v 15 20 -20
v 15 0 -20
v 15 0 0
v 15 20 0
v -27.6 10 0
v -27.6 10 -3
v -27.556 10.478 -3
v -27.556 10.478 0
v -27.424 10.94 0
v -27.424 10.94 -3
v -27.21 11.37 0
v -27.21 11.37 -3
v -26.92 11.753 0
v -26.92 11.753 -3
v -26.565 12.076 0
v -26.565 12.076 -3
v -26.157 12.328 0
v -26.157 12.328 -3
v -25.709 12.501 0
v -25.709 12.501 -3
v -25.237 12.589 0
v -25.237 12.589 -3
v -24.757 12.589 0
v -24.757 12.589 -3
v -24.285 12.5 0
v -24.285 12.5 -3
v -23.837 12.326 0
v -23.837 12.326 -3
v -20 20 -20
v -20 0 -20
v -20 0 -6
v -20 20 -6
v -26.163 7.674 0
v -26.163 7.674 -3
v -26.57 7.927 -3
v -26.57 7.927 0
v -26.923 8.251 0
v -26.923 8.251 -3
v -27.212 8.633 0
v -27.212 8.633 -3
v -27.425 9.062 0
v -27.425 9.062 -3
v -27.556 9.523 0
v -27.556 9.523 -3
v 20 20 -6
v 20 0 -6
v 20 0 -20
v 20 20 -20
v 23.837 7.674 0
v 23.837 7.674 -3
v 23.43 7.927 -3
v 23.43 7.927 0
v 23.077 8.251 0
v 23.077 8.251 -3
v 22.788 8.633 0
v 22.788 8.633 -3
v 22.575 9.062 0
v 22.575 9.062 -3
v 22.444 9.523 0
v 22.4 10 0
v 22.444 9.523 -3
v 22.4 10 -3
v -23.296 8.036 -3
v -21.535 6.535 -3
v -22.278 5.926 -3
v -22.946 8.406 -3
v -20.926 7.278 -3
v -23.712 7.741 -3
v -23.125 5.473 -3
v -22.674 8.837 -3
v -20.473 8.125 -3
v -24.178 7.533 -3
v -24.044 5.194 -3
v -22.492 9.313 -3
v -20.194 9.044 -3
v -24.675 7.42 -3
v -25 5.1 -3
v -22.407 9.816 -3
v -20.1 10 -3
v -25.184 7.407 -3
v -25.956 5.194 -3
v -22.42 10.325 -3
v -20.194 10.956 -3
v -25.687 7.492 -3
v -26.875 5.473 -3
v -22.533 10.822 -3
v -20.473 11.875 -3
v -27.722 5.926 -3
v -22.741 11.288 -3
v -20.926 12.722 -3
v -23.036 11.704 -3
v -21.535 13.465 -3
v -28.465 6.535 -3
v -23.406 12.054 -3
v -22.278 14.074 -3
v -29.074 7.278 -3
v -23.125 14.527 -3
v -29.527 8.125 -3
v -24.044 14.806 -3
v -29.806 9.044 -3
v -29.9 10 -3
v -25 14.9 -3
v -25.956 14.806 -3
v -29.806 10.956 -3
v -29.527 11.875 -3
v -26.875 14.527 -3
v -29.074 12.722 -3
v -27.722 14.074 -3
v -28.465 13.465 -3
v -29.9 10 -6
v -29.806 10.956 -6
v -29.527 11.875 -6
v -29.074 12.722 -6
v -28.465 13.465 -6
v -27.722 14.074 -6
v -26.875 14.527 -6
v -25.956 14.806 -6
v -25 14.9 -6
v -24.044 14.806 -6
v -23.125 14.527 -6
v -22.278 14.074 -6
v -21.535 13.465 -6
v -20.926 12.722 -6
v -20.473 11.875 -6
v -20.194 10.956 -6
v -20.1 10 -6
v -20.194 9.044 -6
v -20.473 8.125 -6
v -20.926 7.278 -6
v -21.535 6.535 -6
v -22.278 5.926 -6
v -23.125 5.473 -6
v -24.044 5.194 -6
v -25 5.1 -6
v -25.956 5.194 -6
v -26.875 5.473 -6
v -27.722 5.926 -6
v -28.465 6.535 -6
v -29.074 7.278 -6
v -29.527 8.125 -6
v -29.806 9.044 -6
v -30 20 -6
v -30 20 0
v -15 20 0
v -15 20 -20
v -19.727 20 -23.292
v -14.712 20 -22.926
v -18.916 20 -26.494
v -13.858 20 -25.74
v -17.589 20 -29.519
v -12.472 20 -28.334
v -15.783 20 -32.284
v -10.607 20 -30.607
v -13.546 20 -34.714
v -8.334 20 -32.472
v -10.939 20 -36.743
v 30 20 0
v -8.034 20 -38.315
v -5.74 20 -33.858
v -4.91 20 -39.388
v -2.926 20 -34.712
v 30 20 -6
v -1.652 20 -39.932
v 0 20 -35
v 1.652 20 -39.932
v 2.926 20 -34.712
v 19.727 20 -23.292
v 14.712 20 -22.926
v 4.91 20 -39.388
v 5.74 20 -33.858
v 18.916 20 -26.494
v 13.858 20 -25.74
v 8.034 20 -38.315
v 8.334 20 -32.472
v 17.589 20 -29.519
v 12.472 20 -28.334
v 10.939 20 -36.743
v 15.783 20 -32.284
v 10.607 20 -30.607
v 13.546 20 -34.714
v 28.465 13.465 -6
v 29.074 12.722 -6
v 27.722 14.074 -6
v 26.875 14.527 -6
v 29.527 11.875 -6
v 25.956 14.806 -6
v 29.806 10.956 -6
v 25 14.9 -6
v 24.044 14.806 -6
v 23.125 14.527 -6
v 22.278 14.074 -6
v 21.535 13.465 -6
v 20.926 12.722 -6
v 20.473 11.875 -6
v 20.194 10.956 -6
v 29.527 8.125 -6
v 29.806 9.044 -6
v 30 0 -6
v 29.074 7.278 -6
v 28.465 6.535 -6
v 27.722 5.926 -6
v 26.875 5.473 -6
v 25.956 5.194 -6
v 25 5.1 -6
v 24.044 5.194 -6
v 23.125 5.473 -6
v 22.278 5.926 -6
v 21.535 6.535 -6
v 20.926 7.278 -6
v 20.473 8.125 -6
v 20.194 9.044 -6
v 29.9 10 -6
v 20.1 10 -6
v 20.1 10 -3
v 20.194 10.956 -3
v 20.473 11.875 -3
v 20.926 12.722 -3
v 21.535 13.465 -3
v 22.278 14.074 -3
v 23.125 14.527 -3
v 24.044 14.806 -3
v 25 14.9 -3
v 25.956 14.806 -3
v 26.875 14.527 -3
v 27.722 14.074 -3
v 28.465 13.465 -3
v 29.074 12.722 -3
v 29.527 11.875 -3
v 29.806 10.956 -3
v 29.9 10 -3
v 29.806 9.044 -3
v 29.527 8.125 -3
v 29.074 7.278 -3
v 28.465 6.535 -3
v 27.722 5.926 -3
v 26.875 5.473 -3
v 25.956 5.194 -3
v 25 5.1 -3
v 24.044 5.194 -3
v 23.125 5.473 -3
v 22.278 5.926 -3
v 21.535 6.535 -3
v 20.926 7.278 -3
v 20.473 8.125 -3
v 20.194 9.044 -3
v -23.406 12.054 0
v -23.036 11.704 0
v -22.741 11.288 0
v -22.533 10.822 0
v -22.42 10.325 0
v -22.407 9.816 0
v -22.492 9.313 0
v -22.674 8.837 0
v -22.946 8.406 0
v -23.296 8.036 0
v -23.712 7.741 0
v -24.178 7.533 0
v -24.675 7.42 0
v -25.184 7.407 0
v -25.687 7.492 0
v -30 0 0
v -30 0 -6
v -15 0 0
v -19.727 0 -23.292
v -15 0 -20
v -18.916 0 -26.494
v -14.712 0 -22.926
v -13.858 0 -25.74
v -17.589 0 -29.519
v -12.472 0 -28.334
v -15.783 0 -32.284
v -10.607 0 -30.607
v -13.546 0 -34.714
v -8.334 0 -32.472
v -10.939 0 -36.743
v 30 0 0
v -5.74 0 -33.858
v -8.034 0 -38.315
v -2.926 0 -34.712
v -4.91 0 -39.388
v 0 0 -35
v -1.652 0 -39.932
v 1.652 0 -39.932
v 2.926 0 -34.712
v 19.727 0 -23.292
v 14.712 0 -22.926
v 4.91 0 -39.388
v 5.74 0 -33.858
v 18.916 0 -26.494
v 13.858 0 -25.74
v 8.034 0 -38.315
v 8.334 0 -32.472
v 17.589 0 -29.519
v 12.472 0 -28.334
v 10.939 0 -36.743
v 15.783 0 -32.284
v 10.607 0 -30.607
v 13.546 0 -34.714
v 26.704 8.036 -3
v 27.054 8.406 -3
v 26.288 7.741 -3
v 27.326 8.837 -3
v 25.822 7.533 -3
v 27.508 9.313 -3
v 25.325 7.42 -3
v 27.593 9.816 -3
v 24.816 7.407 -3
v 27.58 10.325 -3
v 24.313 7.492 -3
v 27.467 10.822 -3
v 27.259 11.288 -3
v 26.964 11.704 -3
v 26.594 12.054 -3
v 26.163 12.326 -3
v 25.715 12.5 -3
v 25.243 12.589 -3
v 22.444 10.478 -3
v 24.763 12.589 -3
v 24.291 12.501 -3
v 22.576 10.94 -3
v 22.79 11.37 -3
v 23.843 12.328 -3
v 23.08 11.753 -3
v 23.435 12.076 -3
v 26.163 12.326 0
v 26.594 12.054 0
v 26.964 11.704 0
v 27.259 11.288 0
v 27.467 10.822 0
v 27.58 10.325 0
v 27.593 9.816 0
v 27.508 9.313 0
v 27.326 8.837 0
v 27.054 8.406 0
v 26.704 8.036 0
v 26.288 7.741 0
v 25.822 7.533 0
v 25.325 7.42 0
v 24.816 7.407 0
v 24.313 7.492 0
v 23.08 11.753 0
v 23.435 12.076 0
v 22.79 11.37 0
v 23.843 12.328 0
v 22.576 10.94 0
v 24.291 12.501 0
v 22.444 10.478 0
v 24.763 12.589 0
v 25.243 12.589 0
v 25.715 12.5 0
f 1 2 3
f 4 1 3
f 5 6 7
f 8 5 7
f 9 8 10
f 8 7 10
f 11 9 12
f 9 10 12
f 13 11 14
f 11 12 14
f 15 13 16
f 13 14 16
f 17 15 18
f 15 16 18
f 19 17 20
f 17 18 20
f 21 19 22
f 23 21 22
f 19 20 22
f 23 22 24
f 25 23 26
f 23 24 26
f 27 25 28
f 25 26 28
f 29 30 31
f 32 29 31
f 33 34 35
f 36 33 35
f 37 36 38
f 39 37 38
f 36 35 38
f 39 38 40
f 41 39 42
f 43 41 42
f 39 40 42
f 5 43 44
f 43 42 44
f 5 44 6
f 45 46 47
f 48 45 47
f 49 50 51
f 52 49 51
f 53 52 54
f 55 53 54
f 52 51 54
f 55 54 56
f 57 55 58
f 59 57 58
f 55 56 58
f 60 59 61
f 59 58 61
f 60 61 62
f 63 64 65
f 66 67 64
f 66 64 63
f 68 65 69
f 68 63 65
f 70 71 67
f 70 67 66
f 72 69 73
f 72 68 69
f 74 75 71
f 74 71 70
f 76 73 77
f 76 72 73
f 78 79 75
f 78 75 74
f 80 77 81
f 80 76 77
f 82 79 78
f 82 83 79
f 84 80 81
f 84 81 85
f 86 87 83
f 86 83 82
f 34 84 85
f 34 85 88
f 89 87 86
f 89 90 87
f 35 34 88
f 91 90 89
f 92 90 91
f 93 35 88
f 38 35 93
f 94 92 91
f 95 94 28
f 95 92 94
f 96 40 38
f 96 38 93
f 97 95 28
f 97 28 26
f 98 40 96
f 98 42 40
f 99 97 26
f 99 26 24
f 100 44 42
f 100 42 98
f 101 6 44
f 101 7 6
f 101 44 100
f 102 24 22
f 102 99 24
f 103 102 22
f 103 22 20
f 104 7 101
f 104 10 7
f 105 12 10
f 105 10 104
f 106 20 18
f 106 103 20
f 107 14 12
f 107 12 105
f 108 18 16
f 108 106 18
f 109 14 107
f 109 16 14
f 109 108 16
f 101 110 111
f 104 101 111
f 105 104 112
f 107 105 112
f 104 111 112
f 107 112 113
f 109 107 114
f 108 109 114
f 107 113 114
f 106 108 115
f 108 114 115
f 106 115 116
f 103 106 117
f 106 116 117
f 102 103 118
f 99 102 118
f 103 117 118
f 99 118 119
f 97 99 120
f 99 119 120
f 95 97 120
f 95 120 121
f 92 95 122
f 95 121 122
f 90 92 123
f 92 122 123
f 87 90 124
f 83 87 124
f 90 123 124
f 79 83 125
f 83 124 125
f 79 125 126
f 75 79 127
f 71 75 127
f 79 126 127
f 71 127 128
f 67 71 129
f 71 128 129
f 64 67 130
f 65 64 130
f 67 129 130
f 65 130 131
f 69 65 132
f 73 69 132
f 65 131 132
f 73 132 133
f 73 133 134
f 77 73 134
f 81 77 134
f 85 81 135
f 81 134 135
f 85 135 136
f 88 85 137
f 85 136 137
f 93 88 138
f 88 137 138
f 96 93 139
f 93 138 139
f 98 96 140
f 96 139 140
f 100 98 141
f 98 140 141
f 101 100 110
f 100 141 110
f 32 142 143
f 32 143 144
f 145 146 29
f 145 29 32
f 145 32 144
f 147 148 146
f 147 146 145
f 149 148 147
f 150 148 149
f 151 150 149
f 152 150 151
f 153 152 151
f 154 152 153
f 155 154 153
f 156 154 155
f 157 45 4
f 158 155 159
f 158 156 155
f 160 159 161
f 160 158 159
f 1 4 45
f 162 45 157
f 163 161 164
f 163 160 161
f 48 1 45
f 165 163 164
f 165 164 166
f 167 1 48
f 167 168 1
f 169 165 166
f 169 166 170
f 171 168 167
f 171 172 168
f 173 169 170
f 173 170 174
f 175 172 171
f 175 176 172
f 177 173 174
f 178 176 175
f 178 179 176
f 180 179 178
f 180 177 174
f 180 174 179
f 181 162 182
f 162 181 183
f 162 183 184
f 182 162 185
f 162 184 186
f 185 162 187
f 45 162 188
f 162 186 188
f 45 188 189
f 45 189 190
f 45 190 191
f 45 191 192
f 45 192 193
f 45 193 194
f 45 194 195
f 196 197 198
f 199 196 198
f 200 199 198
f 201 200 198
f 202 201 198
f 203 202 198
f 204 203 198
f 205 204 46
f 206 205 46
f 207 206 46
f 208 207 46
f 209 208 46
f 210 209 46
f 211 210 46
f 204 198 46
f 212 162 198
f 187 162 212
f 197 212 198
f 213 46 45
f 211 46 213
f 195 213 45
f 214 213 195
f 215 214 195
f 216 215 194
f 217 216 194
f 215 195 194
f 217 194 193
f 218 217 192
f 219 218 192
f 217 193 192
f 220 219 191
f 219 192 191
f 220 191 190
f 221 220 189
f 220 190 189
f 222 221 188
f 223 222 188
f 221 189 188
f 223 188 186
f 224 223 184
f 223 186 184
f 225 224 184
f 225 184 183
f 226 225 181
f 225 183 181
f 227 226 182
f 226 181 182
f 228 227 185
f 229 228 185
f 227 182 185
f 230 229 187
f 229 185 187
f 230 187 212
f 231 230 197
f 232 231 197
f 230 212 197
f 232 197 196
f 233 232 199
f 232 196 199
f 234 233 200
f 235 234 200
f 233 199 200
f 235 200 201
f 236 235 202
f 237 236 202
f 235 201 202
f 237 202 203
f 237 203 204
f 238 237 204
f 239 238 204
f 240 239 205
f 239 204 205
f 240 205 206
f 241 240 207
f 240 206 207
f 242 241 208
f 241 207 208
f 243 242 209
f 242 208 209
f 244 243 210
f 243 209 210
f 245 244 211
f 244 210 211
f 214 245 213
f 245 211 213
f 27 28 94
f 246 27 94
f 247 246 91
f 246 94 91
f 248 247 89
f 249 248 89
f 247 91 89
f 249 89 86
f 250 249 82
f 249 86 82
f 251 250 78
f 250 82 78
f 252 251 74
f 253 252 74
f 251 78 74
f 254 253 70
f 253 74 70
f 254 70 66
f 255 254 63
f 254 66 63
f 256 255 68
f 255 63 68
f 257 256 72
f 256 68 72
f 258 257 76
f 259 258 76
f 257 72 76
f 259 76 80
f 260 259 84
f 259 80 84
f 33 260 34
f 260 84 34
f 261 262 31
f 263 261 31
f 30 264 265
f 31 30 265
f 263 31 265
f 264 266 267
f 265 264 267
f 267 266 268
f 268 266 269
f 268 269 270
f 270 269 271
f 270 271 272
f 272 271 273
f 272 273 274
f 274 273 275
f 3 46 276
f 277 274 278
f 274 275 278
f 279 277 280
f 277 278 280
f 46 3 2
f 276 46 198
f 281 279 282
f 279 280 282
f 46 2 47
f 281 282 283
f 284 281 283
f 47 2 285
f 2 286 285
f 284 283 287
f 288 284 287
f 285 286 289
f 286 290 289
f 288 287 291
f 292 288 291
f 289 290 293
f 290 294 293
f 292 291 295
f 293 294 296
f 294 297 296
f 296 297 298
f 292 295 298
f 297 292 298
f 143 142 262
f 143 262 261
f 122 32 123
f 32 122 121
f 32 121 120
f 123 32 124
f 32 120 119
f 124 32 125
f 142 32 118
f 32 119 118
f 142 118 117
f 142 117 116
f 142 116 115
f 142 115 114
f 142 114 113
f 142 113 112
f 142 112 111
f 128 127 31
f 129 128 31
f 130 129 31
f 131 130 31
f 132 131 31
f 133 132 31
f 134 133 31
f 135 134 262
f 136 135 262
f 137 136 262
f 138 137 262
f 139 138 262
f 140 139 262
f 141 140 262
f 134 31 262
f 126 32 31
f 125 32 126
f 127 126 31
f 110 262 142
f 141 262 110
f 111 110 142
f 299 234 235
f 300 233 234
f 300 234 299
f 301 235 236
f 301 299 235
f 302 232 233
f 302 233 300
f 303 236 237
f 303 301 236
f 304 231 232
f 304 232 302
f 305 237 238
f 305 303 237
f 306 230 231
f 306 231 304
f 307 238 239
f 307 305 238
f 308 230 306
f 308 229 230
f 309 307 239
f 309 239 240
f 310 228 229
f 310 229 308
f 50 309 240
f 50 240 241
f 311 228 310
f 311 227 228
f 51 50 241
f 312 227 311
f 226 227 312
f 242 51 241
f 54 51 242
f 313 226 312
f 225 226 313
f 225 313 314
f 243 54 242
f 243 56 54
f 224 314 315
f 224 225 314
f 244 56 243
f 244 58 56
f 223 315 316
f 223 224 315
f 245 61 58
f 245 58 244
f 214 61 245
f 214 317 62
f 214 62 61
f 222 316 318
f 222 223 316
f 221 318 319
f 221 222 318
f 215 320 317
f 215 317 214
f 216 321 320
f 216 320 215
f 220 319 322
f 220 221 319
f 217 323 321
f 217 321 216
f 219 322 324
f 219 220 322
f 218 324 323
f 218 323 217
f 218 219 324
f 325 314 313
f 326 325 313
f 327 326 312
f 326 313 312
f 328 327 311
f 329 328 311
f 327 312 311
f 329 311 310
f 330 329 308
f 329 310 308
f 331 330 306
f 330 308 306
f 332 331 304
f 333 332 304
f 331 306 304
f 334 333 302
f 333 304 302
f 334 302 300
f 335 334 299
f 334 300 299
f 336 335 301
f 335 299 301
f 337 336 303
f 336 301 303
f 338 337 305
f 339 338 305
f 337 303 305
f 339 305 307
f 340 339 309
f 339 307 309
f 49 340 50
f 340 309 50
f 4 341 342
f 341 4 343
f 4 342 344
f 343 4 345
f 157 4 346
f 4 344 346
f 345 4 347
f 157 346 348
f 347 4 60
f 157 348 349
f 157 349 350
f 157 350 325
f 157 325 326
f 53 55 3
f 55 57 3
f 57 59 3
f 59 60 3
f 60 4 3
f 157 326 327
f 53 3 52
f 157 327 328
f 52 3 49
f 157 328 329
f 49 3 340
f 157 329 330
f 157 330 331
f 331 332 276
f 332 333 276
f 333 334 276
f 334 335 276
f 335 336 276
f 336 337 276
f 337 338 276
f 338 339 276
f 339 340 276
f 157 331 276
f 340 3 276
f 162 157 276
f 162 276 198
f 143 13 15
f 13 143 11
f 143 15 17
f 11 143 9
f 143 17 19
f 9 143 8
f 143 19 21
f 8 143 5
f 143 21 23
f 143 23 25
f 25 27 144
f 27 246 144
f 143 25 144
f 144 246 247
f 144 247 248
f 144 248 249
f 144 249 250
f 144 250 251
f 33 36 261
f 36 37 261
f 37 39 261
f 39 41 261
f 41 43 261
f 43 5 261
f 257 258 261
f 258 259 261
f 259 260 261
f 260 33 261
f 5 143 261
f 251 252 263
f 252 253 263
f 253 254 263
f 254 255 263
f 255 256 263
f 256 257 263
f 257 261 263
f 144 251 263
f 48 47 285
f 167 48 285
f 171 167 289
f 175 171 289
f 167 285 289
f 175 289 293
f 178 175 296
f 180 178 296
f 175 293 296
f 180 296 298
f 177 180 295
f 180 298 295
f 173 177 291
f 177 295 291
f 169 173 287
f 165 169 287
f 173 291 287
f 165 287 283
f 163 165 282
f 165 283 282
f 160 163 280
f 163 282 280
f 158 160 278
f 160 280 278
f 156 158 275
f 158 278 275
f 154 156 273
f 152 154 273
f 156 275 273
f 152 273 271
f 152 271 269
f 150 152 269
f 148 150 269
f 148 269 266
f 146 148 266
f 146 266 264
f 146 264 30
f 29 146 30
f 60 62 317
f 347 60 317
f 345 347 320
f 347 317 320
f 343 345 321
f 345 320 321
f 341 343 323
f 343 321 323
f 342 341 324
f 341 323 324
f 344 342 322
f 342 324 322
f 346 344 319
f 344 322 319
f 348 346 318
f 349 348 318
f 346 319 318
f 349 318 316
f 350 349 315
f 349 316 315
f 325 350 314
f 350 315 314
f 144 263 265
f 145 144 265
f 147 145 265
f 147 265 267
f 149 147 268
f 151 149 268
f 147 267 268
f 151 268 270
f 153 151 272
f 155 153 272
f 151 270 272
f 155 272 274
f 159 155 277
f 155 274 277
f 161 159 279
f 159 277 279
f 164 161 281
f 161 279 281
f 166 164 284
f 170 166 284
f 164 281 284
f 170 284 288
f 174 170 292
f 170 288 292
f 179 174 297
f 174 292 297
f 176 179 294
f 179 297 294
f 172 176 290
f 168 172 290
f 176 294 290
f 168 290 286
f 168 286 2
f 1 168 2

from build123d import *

# Parameters (mm, degrees)
EXTRUDE_1_DEPTH     = 20
CUT_EXTRUDE_1_DEPTH = 20
SKETCH_4_R          = 4.9
CUT_EXTRUDE_3_DEPTH = 3


with BuildPart() as part:
    # 草图1 → 凸台-拉伸1 (new body)
    with BuildSketch(Plane(origin=(0, 0, 0), x_dir=(1, 0, 0), z_dir=(0, 1, 0))):
        with BuildLine():
            Line((15, 0), (20, 0))
            Line((20, 0), (30, 0))
            Line((30, 0), (30, 6))
            Line((30, 6), (20, 6))
            Line((20, 6), (20, 20))
            ThreePointArc((20, 20), (0, 40), (-20, 20))
            Line((-20, 20), (-20, 6))
            Line((-20, 6), (-30, 6))
            Line((-30, 6), (-30, 0))
            Line((-30, 0), (-20, 0))
            Line((-20, 0), (-15, 0))
            Line((-15, 0), (-15, 20))
            ThreePointArc((-15, 20), (0, 35), (15, 20))
            Line((15, 20), (15, 0))
        make_face()
    extrude(amount=EXTRUDE_1_DEPTH)

    # 草图3 → 切除-拉伸1 (cut)
    with BuildSketch(Plane(origin=(0, 0, -6), x_dir=(-1, 0, 0), z_dir=(0, 0, -1))):
        with BuildLine():
            ThreePointArc((27.6, 10), (26.366900892, 12.211692102), (23.837244652, 12.325510697))
            Line((23.837244652, 12.325510697), (26.162755348, 7.674489303))
            ThreePointArc((26.162755348, 7.674489303), (27.211692102, 8.633099108), (27.6, 10))
        make_face()
        with BuildLine():
            Line((26.162755348, 7.674489303), (23.837244652, 12.325510697))
            ThreePointArc((23.837244652, 12.325510697), (22.674489303, 8.837244652), (26.162755348, 7.674489303))
        make_face()
        with BuildLine():
            ThreePointArc((-22.4, 10), (-23.633099108, 12.211692102), (-26.162755348, 12.325510697))
            Line((-26.162755348, 12.325510697), (-23.837244652, 7.674489303))
            ThreePointArc((-23.837244652, 7.674489303), (-22.788307898, 8.633099108), (-22.4, 10))
        make_face()
        with BuildLine():
            Line((-23.837244652, 7.674489303), (-26.162755348, 12.325510697))
            ThreePointArc((-26.162755348, 12.325510697), (-27.325510697, 8.837244652), (-23.837244652, 7.674489303))
        make_face()
    extrude(amount=-CUT_EXTRUDE_1_DEPTH, mode=Mode.SUBTRACT)

    # 草图4 → 切除-拉伸3 (cut)
    with BuildSketch(Plane(origin=(0, 0, -6), x_dir=(-1, 0, 0), z_dir=(0, 0, -1))):
        with Locations((-25, 10)):
            Circle(SKETCH_4_R)
        with Locations((25, 10)):
            Circle(SKETCH_4_R)
    extrude(amount=-CUT_EXTRUDE_3_DEPTH, mode=Mode.SUBTRACT)


solid = part.part
